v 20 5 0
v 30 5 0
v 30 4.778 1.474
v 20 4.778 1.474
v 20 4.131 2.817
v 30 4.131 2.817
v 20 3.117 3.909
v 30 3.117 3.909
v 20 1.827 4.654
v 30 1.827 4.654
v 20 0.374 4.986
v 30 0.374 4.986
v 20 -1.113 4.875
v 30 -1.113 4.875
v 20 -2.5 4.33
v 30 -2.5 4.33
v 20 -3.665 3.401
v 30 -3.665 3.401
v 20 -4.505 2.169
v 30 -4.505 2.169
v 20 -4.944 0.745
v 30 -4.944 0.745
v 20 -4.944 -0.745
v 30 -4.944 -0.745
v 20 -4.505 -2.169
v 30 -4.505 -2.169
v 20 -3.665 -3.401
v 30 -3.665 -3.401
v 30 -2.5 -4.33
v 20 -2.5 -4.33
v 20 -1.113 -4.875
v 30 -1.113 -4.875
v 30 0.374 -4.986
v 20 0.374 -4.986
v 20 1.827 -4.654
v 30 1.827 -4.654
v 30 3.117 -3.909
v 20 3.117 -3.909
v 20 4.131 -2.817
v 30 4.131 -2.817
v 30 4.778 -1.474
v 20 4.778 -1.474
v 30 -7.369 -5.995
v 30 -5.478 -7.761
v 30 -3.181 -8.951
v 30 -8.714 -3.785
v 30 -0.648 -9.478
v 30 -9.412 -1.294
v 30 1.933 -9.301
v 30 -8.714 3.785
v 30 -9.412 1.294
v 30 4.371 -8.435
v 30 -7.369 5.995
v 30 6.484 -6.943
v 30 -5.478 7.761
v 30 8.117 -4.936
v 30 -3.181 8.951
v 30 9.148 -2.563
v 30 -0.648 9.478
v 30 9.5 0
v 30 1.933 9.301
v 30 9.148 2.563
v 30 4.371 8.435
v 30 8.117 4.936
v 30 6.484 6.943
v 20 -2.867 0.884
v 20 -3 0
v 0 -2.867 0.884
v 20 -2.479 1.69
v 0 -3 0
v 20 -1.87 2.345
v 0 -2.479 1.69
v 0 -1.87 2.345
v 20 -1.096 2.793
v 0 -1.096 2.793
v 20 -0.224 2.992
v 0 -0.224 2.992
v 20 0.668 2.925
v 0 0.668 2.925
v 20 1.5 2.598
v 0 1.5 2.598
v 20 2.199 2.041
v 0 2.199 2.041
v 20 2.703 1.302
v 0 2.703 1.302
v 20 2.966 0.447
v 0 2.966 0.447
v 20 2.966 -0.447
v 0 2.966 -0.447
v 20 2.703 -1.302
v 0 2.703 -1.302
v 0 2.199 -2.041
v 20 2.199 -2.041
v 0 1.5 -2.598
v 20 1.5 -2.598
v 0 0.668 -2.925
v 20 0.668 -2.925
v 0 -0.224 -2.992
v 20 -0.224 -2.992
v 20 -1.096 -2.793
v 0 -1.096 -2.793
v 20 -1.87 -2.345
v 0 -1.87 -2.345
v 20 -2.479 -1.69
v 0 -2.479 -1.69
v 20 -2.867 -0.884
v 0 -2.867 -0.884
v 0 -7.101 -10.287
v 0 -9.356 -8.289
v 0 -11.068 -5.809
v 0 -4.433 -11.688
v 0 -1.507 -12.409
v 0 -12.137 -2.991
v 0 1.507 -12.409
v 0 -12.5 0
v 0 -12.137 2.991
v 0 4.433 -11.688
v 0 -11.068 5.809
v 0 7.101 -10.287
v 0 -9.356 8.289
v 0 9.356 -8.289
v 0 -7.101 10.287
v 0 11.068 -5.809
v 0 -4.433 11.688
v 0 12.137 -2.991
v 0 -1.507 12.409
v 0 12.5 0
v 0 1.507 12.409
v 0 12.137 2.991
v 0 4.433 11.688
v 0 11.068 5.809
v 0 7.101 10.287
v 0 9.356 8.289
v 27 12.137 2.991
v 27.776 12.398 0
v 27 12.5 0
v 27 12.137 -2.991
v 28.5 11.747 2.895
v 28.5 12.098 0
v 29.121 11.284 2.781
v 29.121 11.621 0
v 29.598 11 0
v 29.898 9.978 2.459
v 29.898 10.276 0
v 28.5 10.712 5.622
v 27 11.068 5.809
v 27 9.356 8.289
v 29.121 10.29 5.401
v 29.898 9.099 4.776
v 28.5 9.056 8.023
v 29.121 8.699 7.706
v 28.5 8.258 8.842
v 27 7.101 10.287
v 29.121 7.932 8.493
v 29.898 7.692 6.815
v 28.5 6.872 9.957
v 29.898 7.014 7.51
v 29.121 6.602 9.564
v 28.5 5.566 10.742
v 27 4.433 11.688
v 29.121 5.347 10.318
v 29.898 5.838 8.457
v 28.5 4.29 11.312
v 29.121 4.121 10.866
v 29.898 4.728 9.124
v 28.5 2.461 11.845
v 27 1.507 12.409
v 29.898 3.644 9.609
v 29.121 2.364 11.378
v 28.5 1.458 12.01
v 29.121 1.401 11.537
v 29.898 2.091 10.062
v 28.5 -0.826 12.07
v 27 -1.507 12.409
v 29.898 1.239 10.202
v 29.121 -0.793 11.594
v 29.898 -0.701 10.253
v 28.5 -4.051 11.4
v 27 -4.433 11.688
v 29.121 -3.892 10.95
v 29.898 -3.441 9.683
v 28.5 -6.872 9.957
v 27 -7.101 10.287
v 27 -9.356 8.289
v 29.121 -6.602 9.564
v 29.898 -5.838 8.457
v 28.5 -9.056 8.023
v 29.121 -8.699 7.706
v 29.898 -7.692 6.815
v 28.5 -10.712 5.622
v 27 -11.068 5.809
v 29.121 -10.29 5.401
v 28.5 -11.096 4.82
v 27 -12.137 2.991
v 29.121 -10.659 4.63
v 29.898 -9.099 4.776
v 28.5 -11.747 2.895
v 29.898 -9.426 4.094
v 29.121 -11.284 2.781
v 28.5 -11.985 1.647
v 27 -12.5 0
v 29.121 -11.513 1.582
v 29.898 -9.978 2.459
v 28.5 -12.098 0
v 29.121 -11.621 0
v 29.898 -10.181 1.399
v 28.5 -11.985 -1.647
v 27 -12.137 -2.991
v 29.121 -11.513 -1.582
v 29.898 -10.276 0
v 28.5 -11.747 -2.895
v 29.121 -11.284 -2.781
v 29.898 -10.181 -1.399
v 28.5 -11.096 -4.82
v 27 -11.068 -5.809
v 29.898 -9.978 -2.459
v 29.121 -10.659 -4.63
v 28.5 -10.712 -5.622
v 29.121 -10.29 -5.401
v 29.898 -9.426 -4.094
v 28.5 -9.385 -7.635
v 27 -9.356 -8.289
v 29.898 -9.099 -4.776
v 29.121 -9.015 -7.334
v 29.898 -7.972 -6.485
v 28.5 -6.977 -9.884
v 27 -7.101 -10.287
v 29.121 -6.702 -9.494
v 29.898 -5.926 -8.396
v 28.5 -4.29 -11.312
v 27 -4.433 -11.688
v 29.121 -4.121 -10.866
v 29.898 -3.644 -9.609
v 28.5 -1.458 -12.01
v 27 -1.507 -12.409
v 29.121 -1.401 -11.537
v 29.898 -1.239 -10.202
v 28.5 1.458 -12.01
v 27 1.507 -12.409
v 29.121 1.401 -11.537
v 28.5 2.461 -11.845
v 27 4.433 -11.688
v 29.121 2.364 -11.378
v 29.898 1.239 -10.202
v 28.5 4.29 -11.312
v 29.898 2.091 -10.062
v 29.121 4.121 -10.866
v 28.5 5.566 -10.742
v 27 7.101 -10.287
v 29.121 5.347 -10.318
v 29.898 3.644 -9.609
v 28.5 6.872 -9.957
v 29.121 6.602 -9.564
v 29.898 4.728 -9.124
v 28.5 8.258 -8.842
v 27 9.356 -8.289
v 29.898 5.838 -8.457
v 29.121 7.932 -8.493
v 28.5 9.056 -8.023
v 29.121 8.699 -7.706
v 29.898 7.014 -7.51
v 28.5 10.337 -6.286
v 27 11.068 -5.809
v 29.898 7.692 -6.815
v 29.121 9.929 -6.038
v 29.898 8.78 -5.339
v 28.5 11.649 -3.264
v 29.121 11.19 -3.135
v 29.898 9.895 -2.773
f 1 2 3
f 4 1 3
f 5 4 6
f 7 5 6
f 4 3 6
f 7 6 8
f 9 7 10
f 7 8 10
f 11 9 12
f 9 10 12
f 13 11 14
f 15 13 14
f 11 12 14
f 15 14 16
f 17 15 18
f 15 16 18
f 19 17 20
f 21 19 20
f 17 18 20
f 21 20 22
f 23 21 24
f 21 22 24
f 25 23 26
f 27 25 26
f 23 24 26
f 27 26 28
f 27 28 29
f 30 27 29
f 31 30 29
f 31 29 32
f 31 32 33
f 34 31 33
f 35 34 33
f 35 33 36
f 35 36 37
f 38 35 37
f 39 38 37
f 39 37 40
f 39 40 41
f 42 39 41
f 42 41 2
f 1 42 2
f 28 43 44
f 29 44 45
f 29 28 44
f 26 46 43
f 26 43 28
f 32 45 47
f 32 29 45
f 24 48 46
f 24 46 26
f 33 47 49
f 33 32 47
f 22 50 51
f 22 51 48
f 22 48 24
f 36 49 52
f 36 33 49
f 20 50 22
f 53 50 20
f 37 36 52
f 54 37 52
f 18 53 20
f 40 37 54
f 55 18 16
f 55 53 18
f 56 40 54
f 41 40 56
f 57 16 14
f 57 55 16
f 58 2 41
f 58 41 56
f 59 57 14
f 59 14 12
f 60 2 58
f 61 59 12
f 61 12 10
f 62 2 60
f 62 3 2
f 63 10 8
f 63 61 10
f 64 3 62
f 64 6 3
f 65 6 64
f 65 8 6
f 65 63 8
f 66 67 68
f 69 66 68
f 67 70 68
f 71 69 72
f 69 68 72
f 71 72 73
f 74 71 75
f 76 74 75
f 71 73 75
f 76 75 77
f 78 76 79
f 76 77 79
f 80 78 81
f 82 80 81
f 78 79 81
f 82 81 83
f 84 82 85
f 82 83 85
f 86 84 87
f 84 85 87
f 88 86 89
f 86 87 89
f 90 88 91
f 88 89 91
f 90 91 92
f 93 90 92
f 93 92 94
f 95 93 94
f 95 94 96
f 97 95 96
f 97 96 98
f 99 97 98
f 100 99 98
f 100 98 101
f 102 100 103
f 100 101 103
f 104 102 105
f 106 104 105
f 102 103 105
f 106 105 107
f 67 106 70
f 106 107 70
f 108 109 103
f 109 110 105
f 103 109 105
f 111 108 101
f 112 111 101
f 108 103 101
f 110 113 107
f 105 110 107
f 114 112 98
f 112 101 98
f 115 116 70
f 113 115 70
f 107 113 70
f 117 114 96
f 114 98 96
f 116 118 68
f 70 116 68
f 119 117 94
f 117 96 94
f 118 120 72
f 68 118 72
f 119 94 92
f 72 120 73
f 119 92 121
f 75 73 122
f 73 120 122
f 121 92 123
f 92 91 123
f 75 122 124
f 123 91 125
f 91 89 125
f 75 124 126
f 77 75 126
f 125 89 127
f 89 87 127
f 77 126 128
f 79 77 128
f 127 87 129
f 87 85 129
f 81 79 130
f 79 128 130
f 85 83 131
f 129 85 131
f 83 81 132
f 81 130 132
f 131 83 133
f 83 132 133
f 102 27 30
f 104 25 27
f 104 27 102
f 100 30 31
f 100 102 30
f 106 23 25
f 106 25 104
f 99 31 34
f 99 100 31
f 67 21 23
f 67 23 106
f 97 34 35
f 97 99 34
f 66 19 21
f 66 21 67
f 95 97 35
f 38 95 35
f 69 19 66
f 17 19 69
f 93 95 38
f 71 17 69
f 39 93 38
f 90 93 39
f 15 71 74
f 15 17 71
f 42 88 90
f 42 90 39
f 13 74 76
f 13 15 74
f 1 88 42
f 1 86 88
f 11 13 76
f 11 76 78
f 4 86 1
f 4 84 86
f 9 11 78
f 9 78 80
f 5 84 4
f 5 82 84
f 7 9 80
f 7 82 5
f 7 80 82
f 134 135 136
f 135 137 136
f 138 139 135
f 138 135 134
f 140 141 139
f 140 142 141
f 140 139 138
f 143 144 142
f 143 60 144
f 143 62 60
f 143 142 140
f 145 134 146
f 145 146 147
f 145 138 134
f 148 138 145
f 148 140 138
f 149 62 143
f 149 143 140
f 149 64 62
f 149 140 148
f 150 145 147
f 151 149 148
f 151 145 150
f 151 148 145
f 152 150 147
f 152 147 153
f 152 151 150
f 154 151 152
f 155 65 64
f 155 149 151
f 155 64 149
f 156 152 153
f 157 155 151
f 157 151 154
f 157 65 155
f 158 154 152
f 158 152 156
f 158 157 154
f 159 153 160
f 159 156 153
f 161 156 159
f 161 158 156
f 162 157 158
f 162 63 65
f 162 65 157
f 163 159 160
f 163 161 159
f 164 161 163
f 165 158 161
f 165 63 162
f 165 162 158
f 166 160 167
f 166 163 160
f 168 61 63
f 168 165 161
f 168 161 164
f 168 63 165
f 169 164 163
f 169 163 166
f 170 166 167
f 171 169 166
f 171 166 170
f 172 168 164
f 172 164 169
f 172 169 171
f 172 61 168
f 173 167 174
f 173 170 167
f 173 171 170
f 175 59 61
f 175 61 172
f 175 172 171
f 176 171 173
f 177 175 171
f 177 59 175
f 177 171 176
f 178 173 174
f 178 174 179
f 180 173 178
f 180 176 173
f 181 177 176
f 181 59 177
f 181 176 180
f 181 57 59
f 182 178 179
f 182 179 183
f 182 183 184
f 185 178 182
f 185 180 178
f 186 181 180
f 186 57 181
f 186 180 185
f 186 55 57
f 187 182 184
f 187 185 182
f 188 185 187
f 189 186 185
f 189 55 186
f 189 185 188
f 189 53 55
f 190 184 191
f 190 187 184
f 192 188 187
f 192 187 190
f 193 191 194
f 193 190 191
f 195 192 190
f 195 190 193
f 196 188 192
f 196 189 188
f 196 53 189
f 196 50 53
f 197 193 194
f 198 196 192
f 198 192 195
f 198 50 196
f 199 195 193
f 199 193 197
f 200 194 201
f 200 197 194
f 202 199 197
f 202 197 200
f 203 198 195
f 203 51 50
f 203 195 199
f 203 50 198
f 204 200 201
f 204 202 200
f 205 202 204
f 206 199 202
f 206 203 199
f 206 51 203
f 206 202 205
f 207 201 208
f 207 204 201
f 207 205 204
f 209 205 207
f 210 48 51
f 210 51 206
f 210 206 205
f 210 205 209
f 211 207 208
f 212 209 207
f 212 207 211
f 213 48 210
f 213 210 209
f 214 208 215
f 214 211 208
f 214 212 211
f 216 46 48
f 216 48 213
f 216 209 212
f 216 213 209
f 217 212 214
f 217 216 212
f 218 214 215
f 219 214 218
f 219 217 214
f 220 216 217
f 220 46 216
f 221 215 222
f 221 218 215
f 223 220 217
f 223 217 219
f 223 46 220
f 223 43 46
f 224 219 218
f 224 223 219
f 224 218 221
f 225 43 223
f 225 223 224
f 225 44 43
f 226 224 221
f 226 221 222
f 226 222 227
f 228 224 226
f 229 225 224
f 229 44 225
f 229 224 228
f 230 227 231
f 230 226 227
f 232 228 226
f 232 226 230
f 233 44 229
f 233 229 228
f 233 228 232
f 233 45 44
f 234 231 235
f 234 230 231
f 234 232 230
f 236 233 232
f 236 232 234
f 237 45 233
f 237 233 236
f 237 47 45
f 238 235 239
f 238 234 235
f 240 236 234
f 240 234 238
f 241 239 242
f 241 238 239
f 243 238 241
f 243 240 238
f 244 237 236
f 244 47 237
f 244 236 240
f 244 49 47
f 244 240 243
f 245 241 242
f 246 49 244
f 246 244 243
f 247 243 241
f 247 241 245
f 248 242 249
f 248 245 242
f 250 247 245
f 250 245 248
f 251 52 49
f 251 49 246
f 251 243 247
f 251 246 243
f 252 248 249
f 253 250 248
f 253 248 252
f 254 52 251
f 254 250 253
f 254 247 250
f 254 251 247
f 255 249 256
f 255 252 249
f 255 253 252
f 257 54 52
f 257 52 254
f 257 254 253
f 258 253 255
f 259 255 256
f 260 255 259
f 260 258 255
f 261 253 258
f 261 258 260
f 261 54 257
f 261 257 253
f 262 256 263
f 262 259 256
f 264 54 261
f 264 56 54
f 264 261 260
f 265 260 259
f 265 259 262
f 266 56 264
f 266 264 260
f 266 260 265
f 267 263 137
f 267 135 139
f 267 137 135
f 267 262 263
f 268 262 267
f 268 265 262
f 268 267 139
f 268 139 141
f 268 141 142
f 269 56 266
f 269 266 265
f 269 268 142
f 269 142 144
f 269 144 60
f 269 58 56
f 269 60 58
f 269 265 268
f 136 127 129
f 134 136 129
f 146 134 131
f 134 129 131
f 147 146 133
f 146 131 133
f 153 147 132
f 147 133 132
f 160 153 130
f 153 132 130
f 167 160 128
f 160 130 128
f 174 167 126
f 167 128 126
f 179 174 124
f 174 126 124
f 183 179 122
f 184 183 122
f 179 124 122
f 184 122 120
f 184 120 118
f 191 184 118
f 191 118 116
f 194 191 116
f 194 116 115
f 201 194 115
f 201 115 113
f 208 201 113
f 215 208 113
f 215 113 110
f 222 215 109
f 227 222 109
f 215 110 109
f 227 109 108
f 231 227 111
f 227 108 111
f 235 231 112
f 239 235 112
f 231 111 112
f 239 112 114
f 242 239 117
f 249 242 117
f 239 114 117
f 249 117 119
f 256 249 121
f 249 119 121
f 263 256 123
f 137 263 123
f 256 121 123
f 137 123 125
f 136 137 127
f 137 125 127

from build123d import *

# Parameters (mm, degrees)
F0_R           = 12.5
F1_DEPTH       = 30
F2_R           = 3
F4_D           = 6
F4_CBORE_D     = 10
F4_CBORE_DEPTH = 10


with BuildPart() as f1:
    # F0 (on Right) → F1 (new body)
    with BuildSketch(Plane.YZ):
        Circle(F0_R)
    extrude(amount=F1_DEPTH)

    # F2
    f2_edges = [f1.edges().sort_by_distance(p)[0] for p in [
        (30, -12.5, 0),
    ]]
    fillet(f2_edges, radius=F2_R)

    # F4 (through all)
    with Locations(Plane.YZ.offset(30)):
        with Locations((0, 0)):
            CounterBoreHole(F4_D / 2, F4_CBORE_D / 2, F4_CBORE_DEPTH)


solid = f1.part
